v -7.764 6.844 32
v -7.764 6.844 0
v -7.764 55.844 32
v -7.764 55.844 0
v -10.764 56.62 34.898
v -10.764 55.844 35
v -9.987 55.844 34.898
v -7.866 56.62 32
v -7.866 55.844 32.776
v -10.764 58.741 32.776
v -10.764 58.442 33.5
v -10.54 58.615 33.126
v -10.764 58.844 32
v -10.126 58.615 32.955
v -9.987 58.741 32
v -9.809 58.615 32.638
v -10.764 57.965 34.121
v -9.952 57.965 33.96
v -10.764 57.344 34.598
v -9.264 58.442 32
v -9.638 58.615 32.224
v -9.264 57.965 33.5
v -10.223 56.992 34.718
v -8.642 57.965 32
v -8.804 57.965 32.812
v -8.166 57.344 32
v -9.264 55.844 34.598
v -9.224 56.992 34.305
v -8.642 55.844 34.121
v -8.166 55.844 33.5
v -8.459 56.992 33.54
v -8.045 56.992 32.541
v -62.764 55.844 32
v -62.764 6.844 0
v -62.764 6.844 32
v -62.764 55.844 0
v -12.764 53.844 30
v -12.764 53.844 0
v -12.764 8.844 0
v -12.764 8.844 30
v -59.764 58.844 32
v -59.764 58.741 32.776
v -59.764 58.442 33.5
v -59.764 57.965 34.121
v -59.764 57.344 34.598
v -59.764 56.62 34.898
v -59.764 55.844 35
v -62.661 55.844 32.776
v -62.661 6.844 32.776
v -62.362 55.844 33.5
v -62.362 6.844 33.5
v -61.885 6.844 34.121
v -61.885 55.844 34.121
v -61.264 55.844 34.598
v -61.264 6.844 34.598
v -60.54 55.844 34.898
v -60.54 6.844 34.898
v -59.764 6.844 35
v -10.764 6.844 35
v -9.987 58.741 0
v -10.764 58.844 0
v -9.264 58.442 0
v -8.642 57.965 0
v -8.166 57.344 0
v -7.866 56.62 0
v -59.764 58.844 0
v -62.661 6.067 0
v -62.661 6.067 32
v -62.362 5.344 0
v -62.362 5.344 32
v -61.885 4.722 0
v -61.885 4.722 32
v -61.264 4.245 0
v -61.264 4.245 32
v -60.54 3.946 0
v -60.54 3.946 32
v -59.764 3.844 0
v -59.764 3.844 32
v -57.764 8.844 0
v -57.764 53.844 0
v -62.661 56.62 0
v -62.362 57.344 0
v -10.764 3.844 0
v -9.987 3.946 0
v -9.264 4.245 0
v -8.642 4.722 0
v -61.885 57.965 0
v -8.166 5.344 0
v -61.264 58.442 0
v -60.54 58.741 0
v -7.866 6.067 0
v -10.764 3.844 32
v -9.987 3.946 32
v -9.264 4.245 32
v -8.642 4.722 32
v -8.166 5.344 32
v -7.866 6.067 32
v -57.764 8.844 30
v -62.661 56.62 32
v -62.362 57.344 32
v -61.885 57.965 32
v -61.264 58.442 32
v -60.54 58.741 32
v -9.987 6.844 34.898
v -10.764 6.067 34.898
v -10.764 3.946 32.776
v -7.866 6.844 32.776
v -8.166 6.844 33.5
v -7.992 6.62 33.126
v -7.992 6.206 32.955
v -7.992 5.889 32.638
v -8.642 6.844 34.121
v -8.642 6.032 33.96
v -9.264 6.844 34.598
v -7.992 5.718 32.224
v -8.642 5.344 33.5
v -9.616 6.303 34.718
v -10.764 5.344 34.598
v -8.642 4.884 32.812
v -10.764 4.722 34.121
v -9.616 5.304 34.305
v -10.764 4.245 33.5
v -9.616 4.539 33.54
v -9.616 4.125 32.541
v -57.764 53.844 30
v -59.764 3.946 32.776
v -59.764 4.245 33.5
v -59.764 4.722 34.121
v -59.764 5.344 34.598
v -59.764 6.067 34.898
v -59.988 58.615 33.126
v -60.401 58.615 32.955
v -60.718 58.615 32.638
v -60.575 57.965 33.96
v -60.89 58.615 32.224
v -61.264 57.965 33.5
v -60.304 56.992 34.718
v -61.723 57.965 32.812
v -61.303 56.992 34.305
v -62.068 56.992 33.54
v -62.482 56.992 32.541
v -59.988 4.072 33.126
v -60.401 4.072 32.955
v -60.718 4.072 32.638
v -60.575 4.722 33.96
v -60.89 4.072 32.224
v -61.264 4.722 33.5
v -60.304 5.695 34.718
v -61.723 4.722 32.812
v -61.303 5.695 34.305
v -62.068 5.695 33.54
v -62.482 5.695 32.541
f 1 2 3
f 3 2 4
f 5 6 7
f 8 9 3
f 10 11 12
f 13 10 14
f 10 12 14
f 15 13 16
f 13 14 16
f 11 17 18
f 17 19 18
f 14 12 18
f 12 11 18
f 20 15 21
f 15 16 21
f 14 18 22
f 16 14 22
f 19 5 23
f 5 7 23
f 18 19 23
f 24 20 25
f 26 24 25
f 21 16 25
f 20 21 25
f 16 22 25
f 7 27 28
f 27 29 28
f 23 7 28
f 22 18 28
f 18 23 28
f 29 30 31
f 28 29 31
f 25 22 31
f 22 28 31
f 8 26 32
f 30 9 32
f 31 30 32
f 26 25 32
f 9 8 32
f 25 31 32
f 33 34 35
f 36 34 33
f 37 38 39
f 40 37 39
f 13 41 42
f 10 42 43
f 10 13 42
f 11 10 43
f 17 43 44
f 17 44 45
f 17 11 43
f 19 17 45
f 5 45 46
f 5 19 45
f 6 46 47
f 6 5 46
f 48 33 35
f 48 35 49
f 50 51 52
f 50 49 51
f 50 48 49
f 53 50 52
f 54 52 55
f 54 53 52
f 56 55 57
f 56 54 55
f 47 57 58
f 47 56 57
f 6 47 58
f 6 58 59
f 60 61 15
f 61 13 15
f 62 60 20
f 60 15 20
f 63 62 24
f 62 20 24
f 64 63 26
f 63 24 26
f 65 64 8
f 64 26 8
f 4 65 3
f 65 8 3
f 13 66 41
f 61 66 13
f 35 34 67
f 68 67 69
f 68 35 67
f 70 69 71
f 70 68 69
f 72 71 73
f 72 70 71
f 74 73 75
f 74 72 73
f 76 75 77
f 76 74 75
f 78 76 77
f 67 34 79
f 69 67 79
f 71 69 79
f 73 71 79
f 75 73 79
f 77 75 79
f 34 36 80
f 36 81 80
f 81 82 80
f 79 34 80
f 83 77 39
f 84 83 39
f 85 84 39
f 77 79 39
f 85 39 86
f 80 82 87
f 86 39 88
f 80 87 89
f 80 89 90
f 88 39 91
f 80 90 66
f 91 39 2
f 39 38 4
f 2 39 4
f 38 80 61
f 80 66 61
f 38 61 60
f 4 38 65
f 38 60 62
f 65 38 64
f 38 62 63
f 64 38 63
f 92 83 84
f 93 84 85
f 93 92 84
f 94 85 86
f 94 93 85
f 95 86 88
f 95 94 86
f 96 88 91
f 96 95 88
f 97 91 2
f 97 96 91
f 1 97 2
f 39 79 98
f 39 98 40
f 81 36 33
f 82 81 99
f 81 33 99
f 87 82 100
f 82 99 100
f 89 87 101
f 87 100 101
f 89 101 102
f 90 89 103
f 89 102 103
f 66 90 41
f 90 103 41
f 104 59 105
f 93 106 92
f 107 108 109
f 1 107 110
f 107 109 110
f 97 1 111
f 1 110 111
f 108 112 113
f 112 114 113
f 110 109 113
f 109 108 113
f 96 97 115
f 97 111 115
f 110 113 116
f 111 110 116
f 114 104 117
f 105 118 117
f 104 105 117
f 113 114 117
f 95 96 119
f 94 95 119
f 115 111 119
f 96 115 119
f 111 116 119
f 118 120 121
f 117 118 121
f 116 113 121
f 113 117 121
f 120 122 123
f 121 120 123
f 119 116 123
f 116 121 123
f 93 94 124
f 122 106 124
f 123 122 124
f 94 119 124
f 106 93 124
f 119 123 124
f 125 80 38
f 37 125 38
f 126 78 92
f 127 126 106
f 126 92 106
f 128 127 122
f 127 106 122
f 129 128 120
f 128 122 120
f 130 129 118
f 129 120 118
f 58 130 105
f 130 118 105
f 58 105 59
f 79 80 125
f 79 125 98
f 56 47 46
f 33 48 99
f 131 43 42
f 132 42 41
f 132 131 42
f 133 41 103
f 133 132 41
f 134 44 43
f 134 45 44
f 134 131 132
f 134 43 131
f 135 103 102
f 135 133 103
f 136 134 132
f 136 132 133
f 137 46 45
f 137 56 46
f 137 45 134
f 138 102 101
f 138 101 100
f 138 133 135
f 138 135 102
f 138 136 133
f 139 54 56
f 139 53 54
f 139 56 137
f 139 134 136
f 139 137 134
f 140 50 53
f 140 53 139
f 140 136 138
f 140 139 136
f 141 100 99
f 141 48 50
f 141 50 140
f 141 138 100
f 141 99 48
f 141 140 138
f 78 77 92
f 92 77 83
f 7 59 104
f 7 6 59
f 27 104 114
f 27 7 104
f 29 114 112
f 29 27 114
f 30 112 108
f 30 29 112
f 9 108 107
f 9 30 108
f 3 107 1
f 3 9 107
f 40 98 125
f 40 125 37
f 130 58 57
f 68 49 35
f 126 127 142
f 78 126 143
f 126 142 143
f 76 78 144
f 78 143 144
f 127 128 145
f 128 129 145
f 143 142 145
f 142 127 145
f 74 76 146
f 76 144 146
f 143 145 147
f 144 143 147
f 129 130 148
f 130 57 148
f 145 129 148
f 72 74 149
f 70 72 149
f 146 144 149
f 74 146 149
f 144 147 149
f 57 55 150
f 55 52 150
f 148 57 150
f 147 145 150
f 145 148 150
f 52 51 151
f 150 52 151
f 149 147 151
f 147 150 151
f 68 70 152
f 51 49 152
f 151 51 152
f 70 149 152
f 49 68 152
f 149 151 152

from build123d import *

# Parameters (mm, degrees)
F0_W     = 55
F0_H     = 55
F1_DEPTH = 35
F2_W     = 45
F2_H     = 45
F3_DEPTH = 30
F4_R     = 3


with BuildPart() as f1:
    # F0 (on Top) → F1 (new body)
    with BuildSketch(Plane.XY):
        with Locations((-35.2636, 31.343543)):
            Rectangle(F0_W, F0_H)
    extrude(amount=F1_DEPTH)

    # F2 (on face) → F3 (cut)
    with BuildSketch(Plane(origin=(0, 0, 0), x_dir=(1, 0, 0), z_dir=(0, 0, -1))):
        with Locations((-35.2636, -31.343543)):
            Rectangle(F2_W, F2_H)
    extrude(amount=-F3_DEPTH, mode=Mode.SUBTRACT)

    # F4
    f4_edges = [f1.edges().sort_by_distance(p)[0] for p in [
        (-62.7636, 31.343543, 35),
        (-35.2636, 3.843543, 35),
        (-62.7636, 3.843543, 17.5),
        (-7.7636, 31.343543, 35),
        (-35.2636, 58.843543, 35),
        (-62.7636, 58.843543, 17.5),
        (-7.7636, 58.843543, 17.5),
        (-7.7636, 3.843543, 17.5),
    ]]
    fillet(f4_edges, radius=F4_R)


solid = f1.part
